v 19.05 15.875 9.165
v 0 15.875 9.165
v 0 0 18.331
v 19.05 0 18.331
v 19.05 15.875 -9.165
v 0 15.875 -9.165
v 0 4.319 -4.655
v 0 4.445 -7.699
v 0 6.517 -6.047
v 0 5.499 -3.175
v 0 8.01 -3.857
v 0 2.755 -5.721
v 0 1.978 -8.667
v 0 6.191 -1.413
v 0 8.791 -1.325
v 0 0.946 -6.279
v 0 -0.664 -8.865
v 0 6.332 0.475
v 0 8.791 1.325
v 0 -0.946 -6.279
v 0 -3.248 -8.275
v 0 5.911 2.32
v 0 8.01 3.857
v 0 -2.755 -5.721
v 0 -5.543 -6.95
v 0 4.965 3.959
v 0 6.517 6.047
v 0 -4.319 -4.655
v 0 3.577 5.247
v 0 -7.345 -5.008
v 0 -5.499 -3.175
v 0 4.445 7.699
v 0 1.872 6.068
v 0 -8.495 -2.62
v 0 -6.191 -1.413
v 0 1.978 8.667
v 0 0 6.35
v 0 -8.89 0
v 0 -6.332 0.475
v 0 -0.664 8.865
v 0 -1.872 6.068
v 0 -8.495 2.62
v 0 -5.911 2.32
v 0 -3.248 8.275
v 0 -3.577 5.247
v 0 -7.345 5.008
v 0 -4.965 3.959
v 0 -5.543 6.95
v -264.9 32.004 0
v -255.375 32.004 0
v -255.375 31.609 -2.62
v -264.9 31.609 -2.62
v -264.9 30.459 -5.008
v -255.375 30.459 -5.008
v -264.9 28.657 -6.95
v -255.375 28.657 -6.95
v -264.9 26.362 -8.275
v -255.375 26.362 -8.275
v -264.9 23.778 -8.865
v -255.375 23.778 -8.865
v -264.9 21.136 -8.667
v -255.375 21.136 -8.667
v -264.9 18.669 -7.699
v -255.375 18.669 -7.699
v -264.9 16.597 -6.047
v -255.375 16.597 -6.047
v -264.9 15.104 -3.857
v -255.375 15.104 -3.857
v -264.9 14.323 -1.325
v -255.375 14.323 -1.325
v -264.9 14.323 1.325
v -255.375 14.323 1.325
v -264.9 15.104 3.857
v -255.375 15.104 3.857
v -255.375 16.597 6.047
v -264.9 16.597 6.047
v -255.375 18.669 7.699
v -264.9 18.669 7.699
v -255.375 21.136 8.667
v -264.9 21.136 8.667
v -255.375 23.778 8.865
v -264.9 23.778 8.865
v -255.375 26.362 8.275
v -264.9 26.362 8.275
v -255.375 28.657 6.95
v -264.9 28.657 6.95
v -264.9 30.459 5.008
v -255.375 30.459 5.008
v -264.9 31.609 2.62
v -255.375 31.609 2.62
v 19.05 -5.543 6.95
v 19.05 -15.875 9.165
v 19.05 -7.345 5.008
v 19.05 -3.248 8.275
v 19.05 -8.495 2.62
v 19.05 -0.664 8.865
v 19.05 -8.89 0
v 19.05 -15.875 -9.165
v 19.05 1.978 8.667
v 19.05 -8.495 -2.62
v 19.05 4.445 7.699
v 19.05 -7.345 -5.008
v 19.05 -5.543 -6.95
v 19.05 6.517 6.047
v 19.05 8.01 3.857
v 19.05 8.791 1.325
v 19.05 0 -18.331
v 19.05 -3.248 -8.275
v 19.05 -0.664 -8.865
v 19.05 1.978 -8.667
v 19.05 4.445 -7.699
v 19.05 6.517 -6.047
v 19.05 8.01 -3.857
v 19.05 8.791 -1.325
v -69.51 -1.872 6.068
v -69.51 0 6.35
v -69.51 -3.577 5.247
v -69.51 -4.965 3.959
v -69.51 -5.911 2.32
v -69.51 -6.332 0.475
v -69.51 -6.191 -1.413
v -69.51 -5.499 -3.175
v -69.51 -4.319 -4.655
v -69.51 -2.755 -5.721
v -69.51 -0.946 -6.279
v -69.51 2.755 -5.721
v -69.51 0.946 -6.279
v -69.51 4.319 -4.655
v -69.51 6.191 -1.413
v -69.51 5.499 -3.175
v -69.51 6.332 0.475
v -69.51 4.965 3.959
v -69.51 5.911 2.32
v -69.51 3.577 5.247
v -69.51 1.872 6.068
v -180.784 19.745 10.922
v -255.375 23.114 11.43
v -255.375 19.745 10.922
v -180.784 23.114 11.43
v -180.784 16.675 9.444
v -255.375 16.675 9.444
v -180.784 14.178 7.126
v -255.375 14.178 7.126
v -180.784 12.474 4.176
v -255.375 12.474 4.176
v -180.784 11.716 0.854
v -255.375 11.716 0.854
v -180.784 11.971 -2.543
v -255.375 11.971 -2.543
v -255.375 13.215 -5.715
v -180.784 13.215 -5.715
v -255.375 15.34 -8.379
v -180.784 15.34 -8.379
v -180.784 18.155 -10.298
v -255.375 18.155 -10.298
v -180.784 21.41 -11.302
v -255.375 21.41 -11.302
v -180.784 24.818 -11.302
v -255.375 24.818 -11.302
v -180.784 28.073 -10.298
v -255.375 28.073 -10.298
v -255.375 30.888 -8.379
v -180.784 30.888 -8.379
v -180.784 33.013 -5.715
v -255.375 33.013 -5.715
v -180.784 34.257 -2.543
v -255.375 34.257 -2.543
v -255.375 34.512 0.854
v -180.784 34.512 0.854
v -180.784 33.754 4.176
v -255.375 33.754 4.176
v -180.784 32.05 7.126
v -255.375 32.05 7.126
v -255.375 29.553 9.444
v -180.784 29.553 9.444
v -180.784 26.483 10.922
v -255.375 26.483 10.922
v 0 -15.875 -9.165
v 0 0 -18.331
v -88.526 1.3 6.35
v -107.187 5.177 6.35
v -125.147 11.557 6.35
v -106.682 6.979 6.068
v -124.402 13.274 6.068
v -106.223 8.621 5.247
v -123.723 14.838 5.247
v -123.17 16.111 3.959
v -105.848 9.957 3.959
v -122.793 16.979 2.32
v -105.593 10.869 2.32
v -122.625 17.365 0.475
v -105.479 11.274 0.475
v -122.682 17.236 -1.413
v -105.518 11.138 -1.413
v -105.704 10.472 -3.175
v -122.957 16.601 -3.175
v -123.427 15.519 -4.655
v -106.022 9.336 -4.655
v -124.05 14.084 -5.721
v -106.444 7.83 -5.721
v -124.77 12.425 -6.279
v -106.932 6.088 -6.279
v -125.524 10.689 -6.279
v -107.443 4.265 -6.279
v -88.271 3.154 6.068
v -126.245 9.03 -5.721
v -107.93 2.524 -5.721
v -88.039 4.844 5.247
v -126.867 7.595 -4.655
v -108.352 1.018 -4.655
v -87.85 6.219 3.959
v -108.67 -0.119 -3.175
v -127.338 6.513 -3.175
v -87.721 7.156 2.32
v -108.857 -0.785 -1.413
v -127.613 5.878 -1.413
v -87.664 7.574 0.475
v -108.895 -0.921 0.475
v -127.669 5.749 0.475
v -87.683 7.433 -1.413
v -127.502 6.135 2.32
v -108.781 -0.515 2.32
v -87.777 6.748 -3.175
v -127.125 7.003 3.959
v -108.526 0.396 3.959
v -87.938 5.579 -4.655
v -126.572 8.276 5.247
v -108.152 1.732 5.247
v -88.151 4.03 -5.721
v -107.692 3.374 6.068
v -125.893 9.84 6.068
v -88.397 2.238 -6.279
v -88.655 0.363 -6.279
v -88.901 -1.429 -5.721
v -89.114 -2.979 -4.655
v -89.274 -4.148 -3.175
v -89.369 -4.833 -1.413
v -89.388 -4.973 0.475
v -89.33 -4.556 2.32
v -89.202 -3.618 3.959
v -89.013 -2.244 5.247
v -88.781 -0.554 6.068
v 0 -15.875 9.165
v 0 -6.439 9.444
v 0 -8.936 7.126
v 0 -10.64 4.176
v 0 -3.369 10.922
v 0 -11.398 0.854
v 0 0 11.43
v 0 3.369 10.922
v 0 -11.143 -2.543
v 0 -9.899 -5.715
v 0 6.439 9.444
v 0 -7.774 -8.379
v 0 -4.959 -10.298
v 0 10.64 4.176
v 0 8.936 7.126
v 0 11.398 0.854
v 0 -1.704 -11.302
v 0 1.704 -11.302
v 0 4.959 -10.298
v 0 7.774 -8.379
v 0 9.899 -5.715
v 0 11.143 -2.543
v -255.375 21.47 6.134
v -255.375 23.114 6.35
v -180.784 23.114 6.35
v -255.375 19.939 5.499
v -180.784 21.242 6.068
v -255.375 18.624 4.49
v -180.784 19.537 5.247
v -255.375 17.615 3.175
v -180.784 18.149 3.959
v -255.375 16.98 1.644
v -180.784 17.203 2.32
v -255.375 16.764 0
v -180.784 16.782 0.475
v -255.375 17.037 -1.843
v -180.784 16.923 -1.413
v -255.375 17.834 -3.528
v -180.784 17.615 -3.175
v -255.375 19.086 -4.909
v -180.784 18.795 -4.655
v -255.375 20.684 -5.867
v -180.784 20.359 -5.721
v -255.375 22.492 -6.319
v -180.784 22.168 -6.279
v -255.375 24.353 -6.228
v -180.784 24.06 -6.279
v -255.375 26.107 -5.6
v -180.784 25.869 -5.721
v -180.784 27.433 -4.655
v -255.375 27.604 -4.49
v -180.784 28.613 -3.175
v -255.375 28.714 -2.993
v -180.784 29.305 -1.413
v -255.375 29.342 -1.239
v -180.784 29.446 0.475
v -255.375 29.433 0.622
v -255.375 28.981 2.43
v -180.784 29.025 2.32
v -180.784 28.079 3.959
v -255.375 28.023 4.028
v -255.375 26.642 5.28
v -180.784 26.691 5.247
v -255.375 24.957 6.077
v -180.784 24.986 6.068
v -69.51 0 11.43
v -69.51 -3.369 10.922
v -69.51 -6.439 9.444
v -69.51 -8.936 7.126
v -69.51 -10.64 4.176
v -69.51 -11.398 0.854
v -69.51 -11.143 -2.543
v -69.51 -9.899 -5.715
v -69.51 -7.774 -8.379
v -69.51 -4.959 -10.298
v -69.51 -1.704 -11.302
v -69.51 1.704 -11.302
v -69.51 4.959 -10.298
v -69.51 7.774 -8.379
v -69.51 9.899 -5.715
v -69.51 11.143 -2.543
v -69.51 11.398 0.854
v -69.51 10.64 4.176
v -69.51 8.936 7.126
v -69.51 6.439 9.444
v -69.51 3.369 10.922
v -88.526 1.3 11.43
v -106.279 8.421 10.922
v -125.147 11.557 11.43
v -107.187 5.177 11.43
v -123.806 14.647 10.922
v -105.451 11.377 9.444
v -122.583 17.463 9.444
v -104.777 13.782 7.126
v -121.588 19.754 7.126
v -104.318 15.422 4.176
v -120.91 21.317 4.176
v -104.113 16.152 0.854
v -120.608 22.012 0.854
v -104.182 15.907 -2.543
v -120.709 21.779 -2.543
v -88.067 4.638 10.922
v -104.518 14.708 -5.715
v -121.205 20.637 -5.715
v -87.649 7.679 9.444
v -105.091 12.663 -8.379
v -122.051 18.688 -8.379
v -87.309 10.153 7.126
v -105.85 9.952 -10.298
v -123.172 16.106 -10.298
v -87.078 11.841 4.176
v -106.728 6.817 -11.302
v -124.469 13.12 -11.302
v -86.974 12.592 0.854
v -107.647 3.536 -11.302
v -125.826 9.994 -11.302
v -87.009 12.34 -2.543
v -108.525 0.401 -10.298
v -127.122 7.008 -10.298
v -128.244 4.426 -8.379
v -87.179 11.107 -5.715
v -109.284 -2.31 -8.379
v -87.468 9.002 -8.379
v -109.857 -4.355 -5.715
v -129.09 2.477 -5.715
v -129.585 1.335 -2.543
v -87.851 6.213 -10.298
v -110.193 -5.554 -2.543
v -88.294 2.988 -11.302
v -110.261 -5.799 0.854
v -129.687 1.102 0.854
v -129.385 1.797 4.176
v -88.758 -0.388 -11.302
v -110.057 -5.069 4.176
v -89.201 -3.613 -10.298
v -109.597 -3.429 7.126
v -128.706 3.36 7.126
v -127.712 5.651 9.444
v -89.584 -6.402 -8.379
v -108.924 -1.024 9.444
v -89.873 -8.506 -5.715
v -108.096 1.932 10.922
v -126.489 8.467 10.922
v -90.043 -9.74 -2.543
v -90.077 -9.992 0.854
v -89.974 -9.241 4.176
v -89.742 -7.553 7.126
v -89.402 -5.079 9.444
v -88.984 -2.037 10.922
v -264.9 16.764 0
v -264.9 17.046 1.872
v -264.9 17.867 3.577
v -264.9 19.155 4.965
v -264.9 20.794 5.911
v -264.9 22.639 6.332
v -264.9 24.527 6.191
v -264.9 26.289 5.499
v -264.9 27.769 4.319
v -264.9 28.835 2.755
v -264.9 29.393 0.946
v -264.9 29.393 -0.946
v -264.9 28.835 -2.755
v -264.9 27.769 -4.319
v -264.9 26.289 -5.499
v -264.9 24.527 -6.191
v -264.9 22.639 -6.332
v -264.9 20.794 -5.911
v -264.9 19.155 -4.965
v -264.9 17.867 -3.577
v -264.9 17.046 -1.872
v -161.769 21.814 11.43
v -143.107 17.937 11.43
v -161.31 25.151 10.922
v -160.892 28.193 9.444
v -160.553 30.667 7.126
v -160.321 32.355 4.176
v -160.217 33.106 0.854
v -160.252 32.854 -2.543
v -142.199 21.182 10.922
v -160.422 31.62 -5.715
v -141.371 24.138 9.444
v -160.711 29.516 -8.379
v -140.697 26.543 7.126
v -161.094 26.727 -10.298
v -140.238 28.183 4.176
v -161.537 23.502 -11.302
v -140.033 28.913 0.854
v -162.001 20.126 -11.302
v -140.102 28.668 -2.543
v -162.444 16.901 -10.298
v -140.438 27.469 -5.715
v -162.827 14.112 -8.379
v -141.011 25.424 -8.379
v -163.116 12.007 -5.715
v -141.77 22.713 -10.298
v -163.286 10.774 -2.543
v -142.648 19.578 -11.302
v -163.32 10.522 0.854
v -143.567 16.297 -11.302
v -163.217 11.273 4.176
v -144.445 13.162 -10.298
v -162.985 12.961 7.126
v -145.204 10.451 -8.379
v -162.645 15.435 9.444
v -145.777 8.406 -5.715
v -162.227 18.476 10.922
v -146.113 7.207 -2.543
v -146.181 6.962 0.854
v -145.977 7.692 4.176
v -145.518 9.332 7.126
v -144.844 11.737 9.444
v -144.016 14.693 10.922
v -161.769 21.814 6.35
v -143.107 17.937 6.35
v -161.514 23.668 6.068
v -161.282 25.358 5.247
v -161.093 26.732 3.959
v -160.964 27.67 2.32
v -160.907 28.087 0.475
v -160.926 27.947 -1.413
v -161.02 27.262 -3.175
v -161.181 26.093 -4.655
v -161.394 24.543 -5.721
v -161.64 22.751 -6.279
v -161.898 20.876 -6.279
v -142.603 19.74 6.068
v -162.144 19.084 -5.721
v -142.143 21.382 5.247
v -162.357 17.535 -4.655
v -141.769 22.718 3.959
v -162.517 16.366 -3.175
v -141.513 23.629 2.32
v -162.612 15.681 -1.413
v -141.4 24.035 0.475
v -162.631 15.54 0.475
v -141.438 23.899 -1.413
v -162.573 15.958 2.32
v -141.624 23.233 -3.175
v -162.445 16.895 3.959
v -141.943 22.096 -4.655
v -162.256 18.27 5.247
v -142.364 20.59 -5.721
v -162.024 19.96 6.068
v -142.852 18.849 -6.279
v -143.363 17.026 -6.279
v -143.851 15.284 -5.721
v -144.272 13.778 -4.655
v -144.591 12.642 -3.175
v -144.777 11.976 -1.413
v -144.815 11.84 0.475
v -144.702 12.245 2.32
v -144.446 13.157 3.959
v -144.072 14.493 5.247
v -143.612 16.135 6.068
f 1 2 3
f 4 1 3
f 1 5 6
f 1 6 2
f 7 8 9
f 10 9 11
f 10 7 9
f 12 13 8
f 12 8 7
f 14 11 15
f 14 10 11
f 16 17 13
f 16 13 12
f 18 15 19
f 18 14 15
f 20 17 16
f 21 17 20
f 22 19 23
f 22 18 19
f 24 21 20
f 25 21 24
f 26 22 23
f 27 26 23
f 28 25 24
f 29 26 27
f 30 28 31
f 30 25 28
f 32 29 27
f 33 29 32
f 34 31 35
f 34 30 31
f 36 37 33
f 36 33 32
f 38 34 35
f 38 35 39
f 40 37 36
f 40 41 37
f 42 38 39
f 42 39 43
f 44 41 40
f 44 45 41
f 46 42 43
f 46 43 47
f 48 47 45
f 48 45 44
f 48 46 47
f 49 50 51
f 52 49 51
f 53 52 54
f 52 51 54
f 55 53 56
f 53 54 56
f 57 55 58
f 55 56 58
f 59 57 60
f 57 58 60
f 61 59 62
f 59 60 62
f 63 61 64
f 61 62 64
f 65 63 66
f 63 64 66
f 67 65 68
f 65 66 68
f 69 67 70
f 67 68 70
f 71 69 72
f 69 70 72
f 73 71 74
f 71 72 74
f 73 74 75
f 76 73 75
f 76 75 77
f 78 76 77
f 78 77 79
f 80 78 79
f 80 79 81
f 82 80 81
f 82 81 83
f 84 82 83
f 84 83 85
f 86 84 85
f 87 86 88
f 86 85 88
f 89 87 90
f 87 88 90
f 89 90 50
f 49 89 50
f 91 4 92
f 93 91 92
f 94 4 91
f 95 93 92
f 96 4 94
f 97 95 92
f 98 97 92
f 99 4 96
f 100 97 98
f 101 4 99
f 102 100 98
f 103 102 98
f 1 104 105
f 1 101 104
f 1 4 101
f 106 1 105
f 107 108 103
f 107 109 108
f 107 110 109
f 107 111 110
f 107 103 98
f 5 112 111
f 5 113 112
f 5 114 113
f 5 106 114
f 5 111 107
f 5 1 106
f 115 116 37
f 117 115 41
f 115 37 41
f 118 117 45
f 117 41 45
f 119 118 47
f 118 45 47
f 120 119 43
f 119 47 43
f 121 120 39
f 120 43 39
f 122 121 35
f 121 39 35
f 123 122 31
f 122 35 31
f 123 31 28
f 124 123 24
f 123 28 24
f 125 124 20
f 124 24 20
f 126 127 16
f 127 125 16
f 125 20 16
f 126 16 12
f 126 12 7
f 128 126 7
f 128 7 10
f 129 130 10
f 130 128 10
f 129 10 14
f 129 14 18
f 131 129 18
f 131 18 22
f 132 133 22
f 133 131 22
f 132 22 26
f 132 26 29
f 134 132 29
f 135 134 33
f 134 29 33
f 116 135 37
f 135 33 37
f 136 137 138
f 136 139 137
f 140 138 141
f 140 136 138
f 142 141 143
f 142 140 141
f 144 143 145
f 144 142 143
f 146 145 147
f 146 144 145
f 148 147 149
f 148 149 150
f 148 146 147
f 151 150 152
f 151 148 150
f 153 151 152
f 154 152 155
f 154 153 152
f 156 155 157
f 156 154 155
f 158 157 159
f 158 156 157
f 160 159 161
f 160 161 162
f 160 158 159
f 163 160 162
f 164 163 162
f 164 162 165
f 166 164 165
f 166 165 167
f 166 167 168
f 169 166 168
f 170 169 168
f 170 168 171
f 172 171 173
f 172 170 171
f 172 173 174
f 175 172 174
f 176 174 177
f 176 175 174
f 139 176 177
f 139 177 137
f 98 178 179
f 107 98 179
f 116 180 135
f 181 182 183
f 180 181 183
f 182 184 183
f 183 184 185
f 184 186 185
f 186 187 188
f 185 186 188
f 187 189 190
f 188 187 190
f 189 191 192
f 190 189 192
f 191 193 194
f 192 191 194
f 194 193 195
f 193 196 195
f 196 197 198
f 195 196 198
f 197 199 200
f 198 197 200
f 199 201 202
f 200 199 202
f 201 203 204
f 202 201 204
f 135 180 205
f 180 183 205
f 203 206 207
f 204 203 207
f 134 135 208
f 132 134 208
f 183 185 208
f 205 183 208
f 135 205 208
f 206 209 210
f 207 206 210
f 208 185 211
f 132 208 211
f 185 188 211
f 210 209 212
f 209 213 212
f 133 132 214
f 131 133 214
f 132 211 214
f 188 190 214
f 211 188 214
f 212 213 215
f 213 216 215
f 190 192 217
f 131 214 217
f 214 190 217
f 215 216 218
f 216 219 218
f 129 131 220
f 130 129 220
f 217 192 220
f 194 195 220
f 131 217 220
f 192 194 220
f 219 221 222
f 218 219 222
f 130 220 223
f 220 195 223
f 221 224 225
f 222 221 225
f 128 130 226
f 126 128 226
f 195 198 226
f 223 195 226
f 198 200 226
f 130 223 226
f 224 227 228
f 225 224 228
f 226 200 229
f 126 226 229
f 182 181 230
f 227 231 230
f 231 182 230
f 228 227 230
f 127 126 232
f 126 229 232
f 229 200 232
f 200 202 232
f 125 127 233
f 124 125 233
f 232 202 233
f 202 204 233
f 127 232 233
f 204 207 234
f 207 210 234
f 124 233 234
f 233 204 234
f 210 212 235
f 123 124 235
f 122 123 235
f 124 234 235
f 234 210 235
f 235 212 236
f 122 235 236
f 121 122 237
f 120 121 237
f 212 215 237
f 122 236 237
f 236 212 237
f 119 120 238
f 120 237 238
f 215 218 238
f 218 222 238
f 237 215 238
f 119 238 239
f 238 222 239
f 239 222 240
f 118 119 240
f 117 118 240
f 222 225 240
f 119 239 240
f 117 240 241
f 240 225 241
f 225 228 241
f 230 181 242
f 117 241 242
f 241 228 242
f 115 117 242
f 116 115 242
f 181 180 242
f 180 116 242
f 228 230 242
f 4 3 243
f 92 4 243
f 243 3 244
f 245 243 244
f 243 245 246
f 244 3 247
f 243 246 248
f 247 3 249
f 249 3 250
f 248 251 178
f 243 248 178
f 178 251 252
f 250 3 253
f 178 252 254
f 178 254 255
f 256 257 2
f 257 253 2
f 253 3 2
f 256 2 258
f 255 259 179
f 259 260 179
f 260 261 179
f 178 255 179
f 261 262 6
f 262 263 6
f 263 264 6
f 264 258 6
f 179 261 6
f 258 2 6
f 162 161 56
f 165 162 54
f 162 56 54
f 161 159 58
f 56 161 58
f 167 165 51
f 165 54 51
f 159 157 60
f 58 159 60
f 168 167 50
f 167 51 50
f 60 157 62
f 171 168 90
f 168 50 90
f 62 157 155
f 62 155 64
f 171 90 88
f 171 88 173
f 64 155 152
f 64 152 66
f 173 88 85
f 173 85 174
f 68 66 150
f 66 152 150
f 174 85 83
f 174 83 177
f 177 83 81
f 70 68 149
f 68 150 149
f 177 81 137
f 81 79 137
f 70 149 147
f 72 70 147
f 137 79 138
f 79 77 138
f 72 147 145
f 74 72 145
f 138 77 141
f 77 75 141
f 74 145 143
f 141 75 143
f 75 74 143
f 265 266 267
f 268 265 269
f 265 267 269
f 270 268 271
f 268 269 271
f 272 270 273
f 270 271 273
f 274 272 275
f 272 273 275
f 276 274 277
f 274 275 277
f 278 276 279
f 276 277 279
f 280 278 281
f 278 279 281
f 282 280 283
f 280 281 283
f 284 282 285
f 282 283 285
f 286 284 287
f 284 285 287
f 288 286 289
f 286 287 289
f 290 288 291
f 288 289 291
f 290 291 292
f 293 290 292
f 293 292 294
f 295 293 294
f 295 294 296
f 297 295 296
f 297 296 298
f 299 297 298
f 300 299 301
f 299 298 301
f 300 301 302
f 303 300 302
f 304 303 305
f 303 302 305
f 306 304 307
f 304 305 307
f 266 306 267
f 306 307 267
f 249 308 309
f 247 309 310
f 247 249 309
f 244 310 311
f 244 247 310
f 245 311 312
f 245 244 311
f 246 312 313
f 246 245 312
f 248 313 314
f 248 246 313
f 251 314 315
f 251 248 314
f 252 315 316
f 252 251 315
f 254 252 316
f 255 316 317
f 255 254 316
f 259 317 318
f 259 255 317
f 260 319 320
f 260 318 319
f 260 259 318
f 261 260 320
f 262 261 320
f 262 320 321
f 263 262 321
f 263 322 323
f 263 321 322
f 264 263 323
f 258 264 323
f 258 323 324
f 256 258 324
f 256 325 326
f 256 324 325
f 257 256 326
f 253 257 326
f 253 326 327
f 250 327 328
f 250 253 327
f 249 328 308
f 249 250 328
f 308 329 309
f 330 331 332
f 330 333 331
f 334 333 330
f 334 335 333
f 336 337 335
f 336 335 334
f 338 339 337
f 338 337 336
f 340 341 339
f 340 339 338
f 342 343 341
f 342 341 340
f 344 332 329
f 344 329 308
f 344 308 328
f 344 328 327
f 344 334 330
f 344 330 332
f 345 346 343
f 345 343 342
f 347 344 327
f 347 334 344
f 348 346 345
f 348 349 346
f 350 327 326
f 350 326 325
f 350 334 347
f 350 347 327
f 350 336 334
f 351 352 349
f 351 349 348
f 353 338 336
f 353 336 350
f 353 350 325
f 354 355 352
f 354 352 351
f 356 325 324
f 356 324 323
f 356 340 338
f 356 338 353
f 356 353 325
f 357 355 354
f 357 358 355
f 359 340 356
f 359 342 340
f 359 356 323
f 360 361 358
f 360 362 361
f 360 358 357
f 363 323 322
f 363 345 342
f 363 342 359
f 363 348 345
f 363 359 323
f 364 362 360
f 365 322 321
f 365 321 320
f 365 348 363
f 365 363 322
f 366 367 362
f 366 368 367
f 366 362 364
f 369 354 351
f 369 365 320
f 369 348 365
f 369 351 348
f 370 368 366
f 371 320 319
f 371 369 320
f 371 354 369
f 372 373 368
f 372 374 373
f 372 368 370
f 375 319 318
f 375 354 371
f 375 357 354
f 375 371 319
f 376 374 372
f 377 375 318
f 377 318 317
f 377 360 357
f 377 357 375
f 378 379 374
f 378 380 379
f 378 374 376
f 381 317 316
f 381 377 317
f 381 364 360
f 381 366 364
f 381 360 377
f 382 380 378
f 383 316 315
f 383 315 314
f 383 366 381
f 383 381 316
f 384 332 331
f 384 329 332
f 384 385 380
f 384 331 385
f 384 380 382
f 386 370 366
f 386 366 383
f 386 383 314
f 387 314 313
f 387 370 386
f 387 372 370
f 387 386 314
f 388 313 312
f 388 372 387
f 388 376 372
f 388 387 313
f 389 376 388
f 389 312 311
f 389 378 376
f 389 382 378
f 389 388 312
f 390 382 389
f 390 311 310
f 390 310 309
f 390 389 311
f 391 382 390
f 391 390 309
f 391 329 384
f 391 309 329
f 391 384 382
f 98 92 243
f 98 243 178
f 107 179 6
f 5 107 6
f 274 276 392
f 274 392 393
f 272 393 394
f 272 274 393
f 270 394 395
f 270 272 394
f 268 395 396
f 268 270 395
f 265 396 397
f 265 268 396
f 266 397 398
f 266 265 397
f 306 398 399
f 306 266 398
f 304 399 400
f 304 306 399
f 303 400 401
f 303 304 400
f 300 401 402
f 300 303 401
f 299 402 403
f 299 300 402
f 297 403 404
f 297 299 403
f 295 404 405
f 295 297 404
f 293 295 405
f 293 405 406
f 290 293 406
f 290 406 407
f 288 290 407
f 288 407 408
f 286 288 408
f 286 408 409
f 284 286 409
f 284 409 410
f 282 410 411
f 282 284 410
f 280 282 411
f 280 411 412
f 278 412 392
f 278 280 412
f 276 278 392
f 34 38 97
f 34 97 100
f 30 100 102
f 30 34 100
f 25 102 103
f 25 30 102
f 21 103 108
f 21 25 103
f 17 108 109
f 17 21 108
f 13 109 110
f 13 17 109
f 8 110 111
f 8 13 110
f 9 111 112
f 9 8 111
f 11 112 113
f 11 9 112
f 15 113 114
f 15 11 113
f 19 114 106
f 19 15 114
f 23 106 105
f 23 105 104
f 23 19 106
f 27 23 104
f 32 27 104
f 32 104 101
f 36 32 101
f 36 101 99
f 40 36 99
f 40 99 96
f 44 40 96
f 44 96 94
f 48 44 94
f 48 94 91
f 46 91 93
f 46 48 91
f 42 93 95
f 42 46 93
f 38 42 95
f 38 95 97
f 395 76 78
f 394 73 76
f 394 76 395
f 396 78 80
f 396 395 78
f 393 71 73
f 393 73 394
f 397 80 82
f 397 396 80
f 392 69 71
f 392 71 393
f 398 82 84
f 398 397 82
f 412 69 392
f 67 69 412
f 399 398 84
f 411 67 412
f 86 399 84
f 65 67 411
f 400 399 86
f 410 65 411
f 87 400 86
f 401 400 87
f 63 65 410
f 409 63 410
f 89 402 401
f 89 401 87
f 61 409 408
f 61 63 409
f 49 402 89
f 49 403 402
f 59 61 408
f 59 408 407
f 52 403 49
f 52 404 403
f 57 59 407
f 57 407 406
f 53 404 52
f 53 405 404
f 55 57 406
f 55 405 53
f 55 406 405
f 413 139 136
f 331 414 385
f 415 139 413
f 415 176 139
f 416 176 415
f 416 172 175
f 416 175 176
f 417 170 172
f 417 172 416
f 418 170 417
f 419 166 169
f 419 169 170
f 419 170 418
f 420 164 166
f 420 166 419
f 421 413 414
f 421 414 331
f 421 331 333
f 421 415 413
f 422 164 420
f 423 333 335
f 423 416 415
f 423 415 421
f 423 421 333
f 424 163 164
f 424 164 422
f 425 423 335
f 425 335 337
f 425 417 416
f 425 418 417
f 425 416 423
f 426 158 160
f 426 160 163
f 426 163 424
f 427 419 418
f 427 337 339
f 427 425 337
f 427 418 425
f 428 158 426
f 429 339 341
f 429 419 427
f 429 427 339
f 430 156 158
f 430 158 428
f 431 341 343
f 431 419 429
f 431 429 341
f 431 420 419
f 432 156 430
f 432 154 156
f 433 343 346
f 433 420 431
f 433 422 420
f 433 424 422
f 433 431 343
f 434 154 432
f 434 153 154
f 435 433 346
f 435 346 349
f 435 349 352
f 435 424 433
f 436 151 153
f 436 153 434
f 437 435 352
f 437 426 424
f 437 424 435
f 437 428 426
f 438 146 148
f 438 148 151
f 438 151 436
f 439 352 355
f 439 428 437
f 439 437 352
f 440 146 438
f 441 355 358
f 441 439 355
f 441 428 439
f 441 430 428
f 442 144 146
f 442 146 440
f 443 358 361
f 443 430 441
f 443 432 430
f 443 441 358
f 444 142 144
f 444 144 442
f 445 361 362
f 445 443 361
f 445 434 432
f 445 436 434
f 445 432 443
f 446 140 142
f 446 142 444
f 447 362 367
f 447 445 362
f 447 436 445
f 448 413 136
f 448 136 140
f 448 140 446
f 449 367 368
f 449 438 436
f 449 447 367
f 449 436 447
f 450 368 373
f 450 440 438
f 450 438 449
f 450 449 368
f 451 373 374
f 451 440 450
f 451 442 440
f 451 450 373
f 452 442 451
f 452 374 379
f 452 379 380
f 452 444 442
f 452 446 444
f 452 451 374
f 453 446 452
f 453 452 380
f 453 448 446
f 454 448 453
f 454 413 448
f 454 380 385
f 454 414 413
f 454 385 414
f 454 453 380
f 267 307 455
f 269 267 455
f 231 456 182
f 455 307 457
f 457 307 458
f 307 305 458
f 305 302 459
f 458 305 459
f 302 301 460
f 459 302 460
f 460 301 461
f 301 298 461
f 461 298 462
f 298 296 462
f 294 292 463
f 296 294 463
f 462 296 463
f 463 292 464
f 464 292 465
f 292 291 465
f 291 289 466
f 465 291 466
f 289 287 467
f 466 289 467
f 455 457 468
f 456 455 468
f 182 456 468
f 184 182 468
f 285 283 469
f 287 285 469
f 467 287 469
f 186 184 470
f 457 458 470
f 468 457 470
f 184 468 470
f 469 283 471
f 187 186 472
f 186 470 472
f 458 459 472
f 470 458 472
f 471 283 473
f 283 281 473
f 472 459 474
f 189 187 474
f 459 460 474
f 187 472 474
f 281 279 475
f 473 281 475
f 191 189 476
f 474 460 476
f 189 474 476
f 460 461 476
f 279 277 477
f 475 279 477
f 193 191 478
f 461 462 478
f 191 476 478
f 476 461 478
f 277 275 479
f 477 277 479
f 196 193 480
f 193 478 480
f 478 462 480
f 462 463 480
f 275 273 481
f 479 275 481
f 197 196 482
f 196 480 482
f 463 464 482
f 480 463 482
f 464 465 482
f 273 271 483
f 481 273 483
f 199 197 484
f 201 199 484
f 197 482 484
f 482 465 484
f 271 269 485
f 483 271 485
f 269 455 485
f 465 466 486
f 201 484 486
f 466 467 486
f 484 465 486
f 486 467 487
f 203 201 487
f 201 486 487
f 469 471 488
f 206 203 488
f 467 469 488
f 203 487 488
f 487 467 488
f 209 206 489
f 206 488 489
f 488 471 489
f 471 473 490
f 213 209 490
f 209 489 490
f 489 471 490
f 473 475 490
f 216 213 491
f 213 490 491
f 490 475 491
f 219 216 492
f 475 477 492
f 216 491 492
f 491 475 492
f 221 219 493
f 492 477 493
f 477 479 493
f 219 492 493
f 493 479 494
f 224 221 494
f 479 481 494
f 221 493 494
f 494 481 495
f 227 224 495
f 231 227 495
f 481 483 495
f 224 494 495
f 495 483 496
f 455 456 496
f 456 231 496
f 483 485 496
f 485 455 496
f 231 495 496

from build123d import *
from build123d.topology import SkipClean

# Parameters (mm, degrees)
SWEEP_THIN1_PROFILE_R   = 11.43
SWEEP_THIN1_PROFILE_R_2 = 6.35
SKETCH9_R               = 8.89
BOSS_EXTRUDE1_DEPTH     = 19.05
SKETCH10_R              = 8.89
SKETCH10_R_2            = 6.35
BOSS_EXTRUDE2_DEPTH     = 9.525


with BuildPart() as part:
    # Sweep-Thin1: sweep along a curve in space
    with BuildLine() as sweep_thin1_path:
        Line((-69.510499667, 0, 0), (0, 0, 0))
        ThreePointArc((-125.147371892, 11.557, 0), (-97.922758465, 2.919761844, 0), (-69.510499667, 0, 0))
        ThreePointArc((-180.784244117, 23.114, 0), (-152.371985319, 20.194238156, 0), (-125.147371892, 11.557, 0))
        Line((-250.294743784, 23.114, 0), (-180.784244117, 23.114, 0))
        Line((-250.294743784, 23.114, 0), (-255.374743784, 23.114, 0))
    # Sweep-Thin1 profile (on start of the path) → Sweep-Thin1 (sweep)
    with BuildSketch(Plane(origin=(-255.374743784, 23.114, 0), x_dir=(0, 0, 1), z_dir=(1, 0, 0))):
        Circle(SWEEP_THIN1_PROFILE_R)
        Circle(SWEEP_THIN1_PROFILE_R_2, mode=Mode.SUBTRACT)
    sweep(path=sweep_thin1_path.line)

    # Sketch9 → Boss-Extrude1 (add)
    with BuildSketch(Plane(origin=(0, 0, 0), x_dir=(0, 0, -1), z_dir=(1, 0, 0))):
        Polygon((9.165435523, 15.875), (-9.165435523, 15.875), (-18.330871047, 0), (-9.165435523, -15.875), (9.165435523, -15.875), (18.330871047, 0), align=None)
        with Locations(Location((0, 0, 0), (0, 0, 270))):
            Circle(SKETCH9_R, mode=Mode.SUBTRACT)
    extrude(amount=BOSS_EXTRUDE1_DEPTH)

    # Sketch10 → Boss-Extrude2 (add)
    with SkipClean():  # the faces are left unmerged after this step: merging them gives an invalid solid
        with BuildSketch(Plane.ZY.offset(255.374743784)):
            with Locations(Location((0, 23.114, 0), (0, 0, 90))):
                Circle(SKETCH10_R)
            with Locations(Location((0, 23.114, 0), (0, 0, 270))):
                Circle(SKETCH10_R_2, mode=Mode.SUBTRACT)
        extrude(amount=BOSS_EXTRUDE2_DEPTH)


solid = part.part
